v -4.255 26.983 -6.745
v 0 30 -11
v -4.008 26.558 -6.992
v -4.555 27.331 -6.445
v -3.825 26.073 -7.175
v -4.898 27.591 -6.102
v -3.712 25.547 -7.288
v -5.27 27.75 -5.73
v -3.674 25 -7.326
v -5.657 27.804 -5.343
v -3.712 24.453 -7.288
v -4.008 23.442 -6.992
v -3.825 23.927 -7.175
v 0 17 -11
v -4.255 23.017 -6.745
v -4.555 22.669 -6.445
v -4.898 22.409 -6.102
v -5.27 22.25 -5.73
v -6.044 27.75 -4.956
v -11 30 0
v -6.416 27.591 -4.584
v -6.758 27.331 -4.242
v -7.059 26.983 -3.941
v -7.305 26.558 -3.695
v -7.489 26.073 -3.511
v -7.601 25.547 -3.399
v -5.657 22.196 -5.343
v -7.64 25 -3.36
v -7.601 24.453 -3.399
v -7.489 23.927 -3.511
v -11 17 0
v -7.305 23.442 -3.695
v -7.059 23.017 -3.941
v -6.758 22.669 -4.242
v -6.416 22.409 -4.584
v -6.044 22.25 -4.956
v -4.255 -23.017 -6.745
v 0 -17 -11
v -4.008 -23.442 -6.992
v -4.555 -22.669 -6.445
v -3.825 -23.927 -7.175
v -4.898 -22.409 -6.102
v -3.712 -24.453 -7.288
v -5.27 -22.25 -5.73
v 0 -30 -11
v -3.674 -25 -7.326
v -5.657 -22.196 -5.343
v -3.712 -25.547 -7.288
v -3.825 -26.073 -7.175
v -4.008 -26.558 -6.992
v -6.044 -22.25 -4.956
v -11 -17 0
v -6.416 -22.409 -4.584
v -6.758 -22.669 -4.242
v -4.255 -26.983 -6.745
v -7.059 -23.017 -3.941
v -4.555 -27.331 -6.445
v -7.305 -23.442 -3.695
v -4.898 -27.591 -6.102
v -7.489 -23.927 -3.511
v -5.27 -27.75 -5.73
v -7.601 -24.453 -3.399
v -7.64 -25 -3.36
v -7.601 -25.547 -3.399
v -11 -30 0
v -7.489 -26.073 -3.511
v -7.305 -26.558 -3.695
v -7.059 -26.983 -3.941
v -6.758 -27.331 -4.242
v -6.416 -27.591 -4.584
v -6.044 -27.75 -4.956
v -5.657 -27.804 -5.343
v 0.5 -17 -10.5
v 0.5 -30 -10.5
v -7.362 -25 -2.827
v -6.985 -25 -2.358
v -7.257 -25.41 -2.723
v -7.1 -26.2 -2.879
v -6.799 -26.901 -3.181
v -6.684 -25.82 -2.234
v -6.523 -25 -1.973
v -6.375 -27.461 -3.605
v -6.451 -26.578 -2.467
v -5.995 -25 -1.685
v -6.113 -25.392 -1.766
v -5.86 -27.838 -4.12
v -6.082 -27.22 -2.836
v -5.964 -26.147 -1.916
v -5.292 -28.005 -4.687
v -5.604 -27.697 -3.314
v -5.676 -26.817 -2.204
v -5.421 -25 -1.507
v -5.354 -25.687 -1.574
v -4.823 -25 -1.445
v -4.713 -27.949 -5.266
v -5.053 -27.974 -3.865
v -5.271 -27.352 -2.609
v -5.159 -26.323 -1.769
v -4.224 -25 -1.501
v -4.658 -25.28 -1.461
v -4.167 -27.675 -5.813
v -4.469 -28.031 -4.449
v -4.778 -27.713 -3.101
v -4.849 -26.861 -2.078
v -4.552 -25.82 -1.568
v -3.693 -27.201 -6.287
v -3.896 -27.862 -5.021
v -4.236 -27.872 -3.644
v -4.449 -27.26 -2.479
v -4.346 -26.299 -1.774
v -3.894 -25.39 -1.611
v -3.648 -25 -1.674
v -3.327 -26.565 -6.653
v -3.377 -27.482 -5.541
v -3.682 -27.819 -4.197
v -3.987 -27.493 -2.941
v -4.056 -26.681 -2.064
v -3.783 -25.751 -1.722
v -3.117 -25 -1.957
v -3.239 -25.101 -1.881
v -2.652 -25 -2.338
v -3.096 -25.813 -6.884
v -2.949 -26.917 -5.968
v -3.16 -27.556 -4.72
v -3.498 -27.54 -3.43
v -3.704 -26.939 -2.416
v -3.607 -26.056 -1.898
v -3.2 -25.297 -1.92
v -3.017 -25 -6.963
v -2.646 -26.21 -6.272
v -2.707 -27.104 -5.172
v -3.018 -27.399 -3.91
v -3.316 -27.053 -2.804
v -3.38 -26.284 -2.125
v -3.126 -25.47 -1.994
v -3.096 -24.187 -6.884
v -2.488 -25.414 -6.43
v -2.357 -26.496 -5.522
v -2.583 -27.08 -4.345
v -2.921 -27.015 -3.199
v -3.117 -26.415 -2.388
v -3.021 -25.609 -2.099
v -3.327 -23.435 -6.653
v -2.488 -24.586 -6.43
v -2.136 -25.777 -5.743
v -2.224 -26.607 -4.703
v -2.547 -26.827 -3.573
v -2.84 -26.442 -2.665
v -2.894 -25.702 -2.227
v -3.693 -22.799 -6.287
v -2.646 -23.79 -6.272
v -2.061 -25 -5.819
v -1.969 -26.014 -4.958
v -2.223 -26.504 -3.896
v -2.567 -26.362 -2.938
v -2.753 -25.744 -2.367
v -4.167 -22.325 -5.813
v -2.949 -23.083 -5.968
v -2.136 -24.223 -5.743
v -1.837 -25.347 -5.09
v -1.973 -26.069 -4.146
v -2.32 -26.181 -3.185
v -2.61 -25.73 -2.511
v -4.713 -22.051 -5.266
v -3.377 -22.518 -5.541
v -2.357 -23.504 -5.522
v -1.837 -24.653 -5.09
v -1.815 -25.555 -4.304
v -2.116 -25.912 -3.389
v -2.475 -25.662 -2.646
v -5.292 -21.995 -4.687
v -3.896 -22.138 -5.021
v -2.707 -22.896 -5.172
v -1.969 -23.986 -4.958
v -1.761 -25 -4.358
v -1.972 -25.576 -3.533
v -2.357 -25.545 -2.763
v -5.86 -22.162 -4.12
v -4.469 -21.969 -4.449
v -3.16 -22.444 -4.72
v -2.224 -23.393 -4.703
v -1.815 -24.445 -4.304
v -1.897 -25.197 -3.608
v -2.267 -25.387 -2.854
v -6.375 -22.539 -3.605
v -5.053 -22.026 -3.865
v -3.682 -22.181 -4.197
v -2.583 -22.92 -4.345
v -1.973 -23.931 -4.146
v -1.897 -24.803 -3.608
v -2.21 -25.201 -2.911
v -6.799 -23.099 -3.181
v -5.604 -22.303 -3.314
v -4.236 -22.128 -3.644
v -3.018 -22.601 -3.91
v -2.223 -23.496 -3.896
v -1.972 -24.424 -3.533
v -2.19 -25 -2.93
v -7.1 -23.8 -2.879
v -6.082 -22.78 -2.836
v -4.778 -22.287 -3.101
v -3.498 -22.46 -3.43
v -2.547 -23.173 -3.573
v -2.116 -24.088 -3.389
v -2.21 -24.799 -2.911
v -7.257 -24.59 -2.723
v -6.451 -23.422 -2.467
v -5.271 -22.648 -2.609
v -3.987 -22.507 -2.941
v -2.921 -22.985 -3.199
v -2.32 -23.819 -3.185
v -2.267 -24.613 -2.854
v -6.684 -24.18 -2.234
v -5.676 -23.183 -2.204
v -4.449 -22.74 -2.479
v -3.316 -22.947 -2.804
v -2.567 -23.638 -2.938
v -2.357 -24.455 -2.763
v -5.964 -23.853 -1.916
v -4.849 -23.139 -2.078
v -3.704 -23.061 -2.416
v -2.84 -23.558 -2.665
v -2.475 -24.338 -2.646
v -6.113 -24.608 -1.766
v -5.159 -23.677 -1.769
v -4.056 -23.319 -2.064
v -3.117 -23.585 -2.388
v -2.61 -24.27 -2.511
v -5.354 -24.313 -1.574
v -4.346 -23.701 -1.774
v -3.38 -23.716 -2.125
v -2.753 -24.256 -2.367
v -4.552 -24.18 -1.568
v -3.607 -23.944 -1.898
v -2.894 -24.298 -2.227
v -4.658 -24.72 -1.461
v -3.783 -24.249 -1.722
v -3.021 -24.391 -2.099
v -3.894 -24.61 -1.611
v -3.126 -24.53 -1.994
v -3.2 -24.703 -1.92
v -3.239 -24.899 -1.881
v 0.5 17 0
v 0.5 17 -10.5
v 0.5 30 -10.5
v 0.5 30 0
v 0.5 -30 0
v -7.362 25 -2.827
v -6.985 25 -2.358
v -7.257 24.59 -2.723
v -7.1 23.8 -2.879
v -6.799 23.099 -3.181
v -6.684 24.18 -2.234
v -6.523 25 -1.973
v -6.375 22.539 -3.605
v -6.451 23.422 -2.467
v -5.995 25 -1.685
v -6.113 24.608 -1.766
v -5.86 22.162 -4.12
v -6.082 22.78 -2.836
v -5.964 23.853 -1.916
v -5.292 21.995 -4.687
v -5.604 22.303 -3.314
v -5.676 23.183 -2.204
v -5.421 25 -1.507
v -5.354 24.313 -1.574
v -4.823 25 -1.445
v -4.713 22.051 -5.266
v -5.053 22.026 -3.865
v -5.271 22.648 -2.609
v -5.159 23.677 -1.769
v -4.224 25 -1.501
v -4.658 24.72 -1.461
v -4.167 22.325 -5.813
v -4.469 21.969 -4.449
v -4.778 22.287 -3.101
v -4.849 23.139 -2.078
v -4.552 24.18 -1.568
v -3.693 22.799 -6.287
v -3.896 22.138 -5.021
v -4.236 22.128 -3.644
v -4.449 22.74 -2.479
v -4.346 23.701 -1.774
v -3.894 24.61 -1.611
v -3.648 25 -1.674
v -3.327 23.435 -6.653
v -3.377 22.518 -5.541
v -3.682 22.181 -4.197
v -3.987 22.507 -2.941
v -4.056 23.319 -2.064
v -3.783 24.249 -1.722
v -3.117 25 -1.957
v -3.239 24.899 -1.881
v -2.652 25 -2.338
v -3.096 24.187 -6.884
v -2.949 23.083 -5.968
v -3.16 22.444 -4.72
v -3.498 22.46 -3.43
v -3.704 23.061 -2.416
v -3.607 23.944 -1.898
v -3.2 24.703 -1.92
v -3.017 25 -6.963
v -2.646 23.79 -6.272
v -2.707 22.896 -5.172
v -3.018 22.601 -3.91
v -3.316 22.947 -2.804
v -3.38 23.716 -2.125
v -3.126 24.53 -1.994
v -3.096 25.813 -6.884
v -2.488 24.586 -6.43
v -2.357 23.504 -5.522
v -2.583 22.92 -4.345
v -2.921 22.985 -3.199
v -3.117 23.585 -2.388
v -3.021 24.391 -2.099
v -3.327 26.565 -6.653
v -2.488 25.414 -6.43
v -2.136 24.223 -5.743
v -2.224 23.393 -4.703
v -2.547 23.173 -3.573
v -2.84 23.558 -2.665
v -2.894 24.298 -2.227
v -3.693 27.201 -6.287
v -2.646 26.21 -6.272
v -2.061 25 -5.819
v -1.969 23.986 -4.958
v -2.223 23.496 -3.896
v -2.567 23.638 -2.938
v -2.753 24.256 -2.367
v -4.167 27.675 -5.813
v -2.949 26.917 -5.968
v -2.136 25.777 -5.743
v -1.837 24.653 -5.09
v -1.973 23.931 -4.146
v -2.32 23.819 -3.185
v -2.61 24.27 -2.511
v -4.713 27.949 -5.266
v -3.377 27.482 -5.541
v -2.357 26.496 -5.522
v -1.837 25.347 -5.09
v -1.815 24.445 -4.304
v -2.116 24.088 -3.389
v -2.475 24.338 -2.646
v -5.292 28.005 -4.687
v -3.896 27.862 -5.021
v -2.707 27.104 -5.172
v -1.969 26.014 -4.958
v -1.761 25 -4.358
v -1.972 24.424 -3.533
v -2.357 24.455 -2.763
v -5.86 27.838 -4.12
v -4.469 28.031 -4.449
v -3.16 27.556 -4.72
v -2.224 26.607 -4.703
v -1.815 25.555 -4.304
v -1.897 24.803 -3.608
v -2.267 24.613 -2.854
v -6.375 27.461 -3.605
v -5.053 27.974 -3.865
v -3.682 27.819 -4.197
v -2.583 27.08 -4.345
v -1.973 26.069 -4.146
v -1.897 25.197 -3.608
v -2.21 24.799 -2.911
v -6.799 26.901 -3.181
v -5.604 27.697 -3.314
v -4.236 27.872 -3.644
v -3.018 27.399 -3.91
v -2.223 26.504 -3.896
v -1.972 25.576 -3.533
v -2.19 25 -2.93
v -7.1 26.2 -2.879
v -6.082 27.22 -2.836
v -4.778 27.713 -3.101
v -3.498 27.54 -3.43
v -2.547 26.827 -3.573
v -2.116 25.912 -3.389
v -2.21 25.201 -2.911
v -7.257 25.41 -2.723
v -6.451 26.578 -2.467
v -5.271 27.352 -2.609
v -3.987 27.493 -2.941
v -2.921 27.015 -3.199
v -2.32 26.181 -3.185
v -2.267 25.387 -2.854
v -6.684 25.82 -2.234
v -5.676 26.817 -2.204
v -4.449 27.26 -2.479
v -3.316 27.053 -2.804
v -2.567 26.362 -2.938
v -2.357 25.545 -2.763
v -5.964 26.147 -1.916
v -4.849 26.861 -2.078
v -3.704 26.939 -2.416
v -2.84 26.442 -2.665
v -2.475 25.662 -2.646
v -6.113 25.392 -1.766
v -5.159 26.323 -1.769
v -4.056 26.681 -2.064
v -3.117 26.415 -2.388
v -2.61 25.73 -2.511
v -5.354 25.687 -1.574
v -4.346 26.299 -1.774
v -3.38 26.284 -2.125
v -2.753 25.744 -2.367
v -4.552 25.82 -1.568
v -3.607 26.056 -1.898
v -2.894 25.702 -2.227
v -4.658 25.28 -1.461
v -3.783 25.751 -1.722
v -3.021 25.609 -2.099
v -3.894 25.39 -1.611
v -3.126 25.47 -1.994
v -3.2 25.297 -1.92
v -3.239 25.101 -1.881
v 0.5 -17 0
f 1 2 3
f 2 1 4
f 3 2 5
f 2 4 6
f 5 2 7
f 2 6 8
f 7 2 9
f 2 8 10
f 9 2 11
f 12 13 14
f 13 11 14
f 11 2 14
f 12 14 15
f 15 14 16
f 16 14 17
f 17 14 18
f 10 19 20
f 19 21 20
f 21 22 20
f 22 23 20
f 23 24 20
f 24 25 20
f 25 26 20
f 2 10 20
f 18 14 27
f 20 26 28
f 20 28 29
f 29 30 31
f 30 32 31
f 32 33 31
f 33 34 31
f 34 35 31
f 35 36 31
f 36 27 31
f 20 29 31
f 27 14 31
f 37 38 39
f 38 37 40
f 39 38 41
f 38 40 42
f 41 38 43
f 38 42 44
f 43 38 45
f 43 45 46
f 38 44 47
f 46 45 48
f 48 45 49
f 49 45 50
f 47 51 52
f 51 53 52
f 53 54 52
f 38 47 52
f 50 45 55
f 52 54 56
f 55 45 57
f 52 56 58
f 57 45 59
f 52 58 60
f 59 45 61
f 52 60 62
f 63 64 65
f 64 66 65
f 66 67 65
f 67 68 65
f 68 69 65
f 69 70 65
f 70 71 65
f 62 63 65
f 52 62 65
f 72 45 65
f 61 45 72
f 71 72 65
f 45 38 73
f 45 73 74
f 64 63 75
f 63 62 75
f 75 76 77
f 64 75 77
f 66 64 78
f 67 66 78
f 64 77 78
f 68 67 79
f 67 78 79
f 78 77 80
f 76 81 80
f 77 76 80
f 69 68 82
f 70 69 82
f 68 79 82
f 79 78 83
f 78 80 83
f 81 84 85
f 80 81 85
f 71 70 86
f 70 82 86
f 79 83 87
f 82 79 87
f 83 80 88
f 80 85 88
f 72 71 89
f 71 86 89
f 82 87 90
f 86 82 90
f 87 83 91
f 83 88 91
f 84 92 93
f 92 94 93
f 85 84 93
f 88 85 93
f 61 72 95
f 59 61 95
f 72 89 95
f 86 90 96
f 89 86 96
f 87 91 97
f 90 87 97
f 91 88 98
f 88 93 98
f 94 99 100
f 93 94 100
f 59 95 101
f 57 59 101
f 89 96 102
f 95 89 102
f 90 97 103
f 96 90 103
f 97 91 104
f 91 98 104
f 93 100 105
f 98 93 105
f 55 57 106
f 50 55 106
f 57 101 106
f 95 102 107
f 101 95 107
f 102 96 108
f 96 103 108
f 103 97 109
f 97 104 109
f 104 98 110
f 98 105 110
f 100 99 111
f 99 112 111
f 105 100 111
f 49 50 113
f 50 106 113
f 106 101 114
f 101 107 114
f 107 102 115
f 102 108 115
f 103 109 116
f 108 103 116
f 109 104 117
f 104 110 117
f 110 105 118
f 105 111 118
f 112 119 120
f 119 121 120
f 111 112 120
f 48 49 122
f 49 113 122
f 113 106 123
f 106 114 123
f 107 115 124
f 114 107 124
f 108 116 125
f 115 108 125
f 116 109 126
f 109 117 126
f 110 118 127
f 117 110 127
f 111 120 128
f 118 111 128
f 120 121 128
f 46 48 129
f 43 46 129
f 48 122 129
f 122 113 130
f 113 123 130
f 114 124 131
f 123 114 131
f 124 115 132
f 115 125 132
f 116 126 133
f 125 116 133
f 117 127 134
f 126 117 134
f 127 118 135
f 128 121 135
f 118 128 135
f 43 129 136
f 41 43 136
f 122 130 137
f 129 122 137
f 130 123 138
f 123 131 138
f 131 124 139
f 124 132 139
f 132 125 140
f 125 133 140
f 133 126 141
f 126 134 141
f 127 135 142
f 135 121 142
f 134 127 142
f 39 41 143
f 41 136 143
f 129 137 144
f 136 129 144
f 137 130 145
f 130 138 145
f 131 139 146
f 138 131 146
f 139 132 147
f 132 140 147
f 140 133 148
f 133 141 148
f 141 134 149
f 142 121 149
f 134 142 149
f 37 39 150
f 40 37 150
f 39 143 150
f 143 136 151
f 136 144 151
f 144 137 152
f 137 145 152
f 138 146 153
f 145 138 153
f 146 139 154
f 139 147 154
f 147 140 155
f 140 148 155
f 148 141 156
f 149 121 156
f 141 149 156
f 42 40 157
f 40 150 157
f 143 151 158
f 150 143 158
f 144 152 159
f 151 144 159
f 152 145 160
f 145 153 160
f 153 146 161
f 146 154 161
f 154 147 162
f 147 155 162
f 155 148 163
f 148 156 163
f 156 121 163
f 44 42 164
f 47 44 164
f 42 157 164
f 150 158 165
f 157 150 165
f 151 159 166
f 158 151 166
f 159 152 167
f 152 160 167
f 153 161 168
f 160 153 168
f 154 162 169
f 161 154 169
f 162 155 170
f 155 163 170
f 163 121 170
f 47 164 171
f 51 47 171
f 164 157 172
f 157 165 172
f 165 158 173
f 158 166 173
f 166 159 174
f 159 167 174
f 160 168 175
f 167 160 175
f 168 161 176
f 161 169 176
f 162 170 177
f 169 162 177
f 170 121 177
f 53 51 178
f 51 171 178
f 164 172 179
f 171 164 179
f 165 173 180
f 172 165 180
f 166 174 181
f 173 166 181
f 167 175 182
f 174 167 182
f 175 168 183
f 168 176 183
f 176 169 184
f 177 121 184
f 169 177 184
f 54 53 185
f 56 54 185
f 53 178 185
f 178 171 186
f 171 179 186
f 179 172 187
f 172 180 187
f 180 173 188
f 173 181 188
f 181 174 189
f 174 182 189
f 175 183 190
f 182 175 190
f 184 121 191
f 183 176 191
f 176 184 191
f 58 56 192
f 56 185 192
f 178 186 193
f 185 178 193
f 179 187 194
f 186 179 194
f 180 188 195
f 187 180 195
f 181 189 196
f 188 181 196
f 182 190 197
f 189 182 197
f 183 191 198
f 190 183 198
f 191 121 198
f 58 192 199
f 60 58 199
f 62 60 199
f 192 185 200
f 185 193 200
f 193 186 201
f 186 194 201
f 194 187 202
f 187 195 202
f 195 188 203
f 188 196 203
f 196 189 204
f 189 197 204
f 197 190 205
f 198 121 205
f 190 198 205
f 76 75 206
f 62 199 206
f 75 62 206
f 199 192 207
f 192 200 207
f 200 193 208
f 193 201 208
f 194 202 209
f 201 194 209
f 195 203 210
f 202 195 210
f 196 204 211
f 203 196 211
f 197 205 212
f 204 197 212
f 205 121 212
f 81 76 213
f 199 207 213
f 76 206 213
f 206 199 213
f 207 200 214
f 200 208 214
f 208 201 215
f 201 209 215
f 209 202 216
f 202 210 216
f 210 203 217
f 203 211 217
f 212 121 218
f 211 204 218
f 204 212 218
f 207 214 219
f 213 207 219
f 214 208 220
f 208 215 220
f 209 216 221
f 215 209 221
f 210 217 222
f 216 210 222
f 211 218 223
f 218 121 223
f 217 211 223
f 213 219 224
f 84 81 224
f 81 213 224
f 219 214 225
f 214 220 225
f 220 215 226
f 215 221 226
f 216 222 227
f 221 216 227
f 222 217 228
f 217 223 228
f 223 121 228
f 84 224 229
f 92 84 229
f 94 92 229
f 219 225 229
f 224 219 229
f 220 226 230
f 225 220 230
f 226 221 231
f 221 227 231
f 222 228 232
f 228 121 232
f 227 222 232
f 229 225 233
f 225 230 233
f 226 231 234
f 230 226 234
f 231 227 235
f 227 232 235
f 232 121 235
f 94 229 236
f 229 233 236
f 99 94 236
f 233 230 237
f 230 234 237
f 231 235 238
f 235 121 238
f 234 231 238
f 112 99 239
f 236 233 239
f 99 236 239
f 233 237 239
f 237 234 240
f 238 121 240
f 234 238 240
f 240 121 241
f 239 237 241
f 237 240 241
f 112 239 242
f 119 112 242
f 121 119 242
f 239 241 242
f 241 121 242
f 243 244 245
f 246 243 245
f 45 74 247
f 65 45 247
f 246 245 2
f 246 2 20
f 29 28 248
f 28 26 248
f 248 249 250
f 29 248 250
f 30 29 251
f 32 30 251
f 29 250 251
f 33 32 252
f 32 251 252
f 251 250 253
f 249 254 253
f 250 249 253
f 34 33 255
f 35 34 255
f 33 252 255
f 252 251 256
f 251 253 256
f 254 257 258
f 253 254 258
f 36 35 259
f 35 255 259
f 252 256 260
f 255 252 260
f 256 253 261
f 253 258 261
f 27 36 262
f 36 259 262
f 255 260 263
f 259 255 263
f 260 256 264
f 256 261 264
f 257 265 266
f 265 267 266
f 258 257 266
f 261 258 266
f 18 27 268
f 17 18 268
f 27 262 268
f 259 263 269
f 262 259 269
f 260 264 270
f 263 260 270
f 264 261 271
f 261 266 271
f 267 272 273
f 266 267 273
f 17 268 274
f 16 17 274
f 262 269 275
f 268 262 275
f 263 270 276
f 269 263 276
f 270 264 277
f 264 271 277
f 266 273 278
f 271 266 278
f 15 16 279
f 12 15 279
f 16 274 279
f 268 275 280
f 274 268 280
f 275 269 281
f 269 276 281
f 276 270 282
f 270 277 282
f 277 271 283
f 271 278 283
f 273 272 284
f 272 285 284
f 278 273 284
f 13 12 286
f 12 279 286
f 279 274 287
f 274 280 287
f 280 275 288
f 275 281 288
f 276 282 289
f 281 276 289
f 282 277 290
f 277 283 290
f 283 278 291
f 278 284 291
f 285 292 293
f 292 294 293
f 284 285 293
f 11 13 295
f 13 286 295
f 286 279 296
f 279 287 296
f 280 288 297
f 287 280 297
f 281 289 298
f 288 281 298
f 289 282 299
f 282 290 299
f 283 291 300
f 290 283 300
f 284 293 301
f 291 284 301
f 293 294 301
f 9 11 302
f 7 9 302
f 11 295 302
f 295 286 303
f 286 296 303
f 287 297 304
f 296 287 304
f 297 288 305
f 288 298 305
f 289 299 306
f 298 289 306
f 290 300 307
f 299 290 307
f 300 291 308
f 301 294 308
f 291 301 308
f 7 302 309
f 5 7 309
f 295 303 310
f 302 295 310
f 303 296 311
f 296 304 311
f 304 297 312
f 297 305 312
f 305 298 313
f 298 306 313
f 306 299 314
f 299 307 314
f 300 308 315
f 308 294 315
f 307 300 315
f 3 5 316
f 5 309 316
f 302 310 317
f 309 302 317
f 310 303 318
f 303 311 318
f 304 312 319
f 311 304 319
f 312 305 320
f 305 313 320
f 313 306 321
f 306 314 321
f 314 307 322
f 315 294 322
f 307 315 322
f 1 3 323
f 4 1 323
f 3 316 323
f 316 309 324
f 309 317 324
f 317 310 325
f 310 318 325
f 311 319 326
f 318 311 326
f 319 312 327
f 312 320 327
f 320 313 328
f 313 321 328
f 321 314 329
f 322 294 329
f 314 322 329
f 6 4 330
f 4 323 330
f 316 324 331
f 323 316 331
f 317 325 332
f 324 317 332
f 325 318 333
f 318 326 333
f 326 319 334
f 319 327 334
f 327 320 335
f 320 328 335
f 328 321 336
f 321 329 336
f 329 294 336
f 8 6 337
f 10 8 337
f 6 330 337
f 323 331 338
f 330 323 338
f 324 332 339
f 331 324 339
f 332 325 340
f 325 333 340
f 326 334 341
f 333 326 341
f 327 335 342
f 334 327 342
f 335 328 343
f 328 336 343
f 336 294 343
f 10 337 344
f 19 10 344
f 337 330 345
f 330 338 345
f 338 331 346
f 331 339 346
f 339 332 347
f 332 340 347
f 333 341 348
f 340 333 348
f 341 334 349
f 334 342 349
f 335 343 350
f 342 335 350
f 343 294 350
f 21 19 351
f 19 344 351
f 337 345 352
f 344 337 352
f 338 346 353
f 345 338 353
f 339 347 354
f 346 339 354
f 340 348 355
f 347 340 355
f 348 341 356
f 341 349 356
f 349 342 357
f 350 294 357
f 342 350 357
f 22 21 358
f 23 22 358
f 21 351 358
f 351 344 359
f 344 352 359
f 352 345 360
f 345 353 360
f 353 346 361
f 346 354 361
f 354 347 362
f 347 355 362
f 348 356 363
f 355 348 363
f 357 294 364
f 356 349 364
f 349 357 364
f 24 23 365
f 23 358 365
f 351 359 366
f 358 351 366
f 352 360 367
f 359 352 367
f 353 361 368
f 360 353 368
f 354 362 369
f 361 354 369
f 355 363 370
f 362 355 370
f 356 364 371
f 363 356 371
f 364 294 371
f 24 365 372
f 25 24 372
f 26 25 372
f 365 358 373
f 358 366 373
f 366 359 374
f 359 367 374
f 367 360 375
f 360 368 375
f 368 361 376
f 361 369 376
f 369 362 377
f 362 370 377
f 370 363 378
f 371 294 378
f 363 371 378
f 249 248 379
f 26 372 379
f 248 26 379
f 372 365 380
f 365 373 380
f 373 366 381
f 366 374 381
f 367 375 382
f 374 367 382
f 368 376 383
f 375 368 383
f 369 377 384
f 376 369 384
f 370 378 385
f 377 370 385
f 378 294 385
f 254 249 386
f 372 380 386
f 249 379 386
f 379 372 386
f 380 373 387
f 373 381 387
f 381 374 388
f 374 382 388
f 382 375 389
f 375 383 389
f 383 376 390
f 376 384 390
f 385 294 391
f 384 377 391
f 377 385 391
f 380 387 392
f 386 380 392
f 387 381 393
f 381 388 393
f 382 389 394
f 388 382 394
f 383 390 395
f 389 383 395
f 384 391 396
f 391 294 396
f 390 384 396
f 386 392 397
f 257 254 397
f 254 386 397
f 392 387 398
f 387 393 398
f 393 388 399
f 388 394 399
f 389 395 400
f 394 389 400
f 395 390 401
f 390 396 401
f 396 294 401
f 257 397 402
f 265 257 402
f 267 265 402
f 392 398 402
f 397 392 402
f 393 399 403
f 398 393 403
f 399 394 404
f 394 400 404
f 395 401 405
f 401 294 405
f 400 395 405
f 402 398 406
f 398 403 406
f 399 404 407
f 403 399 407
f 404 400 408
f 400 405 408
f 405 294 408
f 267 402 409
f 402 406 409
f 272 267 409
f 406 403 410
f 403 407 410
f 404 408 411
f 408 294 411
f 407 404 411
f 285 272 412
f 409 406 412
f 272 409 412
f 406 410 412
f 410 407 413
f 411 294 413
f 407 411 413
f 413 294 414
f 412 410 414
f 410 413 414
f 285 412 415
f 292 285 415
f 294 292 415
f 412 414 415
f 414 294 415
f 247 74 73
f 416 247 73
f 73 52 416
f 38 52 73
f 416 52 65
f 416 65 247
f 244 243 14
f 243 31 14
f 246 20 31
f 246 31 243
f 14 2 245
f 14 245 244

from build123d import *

# Parameters (mm, degrees)
BOX112015002017004007004038010_W     = 31
BOX112015002017004007004038010_H     = 70
BOX112015002017004007004038010_DEPTH = 15
BOX112015002017004007004038009_W     = 31
BOX112015002017004007004038009_H     = 34
BOX112015002017004007004038009_DEPTH = 15
BOX112015002017004007004018_W        = 100
BOX112015002017004007004018_H        = 100
BOX112015002017004007004018_DEPTH    = 20
BOX112015002017004007004017_W        = 16
BOX112015002017004007004017_H        = 60
BOX112015002017004007004017_DEPTH    = 16
CUT254_PLACEMENT_ANGLE               = 135
CUT255_PLACEMENT_ANGLE               = 180


with BuildPart() as cube126:
    # Box112015002017004007004038010 → Box112015002017004007004038010 (new body)
    with BuildSketch(Plane(origin=(0.5, -35, -13), x_dir=(1, 0, 0), z_dir=(0, 0, 1))):
        with Locations((15.5, 35)):
            Rectangle(BOX112015002017004007004038010_W, BOX112015002017004007004038010_H)
    extrude(amount=BOX112015002017004007004038010_DEPTH)


with BuildPart() as fusion051010010012015014030:
    # Box112015002017004007004038009 → Box112015002017004007004038009 (new body)
    with BuildSketch(Plane(origin=(-15.5, -17, -13), x_dir=(1, 0, 0), z_dir=(0, 0, 1))):
        with Locations((15.5, 17)):
            Rectangle(BOX112015002017004007004038009_W, BOX112015002017004007004038009_H)
    extrude(amount=BOX112015002017004007004038009_DEPTH)

    # Fusion051010010012015014030: union Cube126
    add(cube126.part)


with BuildPart() as cube101:
    # Box112015002017004007004018 → Box112015002017004007004018 (new body)
    with BuildSketch(Plane(origin=(-50, -50, -28), x_dir=(1, 0, 0), z_dir=(0, 0, 1))):
        with Locations((50, 50)):
            Rectangle(BOX112015002017004007004018_W, BOX112015002017004007004018_H)
    extrude(amount=BOX112015002017004007004018_DEPTH)


with BuildPart() as sphere006006006006009:
    # Sphere006006006006009 → Sphere006006006006009 (revolve)
    with BuildSketch(Plane(origin=(8, -25, 1.2), x_dir=(1, 0, 0), z_dir=(0, -1, 0))):
        with BuildLine():
            ThreePointArc((0, -3.05), (3.05, 0), (0, 3.05))
            Line((0, 3.05), (0, -3.05))
        make_face()
    revolve(axis=Axis((8, -25, 1.2), (0, 0, 1)))


with BuildPart() as sphere006006006006008:
    # Sphere006006006006008 → Sphere006006006006008 (revolve)
    with BuildSketch(Plane(origin=(8, 25, 1.2), x_dir=(1, 0, 0), z_dir=(0, -1, 0))):
        with BuildLine():
            ThreePointArc((0, -3.05), (3.05, 0), (0, 3.05))
            Line((0, 3.05), (0, -3.05))
        make_face()
    revolve(axis=Axis((8, 25, 1.2), (0, 0, 1)))


with BuildPart() as ball_socket_tabs:
    # Box112015002017004007004017 → Box112015002017004007004017 (new body)
    with BuildSketch(Plane(origin=(0, -30, 0), x_dir=(1, 0, 0), z_dir=(0, 0, 1))):
        with Locations((8, 30)):
            Rectangle(BOX112015002017004007004017_W, BOX112015002017004007004017_H)
    extrude(amount=BOX112015002017004007004017_DEPTH)

    # Cut253: cut Sphere006006006006008
    add(sphere006006006006008.part, mode=Mode.SUBTRACT)

    # Cut254: cut Sphere006006006006009
    add(sphere006006006006009.part, mode=Mode.SUBTRACT)


with BuildPart() as ball_socket_tabs_1:
    # Cut254 placement: moved
    add(ball_socket_tabs.part.moved(Location((-22, 0, 3))).rotate(Axis((-22, 0, 3), (0, 1, 0)), CUT254_PLACEMENT_ANGLE))

    # Cut255: cut Cube101
    add(cube101.part, mode=Mode.SUBTRACT)


with BuildPart() as ball_socket_tabs_2:
    # Cut255 placement: moved
    add(ball_socket_tabs_1.part.moved(Location((22, 0, -8))).rotate(Axis((22, 0, -8), (1, 0, 0)), CUT255_PLACEMENT_ANGLE))

    # Cut294: cut Fusion051010010012015014030
    add(fusion051010010012015014030.part, mode=Mode.SUBTRACT)


solid = ball_socket_tabs_2.part
